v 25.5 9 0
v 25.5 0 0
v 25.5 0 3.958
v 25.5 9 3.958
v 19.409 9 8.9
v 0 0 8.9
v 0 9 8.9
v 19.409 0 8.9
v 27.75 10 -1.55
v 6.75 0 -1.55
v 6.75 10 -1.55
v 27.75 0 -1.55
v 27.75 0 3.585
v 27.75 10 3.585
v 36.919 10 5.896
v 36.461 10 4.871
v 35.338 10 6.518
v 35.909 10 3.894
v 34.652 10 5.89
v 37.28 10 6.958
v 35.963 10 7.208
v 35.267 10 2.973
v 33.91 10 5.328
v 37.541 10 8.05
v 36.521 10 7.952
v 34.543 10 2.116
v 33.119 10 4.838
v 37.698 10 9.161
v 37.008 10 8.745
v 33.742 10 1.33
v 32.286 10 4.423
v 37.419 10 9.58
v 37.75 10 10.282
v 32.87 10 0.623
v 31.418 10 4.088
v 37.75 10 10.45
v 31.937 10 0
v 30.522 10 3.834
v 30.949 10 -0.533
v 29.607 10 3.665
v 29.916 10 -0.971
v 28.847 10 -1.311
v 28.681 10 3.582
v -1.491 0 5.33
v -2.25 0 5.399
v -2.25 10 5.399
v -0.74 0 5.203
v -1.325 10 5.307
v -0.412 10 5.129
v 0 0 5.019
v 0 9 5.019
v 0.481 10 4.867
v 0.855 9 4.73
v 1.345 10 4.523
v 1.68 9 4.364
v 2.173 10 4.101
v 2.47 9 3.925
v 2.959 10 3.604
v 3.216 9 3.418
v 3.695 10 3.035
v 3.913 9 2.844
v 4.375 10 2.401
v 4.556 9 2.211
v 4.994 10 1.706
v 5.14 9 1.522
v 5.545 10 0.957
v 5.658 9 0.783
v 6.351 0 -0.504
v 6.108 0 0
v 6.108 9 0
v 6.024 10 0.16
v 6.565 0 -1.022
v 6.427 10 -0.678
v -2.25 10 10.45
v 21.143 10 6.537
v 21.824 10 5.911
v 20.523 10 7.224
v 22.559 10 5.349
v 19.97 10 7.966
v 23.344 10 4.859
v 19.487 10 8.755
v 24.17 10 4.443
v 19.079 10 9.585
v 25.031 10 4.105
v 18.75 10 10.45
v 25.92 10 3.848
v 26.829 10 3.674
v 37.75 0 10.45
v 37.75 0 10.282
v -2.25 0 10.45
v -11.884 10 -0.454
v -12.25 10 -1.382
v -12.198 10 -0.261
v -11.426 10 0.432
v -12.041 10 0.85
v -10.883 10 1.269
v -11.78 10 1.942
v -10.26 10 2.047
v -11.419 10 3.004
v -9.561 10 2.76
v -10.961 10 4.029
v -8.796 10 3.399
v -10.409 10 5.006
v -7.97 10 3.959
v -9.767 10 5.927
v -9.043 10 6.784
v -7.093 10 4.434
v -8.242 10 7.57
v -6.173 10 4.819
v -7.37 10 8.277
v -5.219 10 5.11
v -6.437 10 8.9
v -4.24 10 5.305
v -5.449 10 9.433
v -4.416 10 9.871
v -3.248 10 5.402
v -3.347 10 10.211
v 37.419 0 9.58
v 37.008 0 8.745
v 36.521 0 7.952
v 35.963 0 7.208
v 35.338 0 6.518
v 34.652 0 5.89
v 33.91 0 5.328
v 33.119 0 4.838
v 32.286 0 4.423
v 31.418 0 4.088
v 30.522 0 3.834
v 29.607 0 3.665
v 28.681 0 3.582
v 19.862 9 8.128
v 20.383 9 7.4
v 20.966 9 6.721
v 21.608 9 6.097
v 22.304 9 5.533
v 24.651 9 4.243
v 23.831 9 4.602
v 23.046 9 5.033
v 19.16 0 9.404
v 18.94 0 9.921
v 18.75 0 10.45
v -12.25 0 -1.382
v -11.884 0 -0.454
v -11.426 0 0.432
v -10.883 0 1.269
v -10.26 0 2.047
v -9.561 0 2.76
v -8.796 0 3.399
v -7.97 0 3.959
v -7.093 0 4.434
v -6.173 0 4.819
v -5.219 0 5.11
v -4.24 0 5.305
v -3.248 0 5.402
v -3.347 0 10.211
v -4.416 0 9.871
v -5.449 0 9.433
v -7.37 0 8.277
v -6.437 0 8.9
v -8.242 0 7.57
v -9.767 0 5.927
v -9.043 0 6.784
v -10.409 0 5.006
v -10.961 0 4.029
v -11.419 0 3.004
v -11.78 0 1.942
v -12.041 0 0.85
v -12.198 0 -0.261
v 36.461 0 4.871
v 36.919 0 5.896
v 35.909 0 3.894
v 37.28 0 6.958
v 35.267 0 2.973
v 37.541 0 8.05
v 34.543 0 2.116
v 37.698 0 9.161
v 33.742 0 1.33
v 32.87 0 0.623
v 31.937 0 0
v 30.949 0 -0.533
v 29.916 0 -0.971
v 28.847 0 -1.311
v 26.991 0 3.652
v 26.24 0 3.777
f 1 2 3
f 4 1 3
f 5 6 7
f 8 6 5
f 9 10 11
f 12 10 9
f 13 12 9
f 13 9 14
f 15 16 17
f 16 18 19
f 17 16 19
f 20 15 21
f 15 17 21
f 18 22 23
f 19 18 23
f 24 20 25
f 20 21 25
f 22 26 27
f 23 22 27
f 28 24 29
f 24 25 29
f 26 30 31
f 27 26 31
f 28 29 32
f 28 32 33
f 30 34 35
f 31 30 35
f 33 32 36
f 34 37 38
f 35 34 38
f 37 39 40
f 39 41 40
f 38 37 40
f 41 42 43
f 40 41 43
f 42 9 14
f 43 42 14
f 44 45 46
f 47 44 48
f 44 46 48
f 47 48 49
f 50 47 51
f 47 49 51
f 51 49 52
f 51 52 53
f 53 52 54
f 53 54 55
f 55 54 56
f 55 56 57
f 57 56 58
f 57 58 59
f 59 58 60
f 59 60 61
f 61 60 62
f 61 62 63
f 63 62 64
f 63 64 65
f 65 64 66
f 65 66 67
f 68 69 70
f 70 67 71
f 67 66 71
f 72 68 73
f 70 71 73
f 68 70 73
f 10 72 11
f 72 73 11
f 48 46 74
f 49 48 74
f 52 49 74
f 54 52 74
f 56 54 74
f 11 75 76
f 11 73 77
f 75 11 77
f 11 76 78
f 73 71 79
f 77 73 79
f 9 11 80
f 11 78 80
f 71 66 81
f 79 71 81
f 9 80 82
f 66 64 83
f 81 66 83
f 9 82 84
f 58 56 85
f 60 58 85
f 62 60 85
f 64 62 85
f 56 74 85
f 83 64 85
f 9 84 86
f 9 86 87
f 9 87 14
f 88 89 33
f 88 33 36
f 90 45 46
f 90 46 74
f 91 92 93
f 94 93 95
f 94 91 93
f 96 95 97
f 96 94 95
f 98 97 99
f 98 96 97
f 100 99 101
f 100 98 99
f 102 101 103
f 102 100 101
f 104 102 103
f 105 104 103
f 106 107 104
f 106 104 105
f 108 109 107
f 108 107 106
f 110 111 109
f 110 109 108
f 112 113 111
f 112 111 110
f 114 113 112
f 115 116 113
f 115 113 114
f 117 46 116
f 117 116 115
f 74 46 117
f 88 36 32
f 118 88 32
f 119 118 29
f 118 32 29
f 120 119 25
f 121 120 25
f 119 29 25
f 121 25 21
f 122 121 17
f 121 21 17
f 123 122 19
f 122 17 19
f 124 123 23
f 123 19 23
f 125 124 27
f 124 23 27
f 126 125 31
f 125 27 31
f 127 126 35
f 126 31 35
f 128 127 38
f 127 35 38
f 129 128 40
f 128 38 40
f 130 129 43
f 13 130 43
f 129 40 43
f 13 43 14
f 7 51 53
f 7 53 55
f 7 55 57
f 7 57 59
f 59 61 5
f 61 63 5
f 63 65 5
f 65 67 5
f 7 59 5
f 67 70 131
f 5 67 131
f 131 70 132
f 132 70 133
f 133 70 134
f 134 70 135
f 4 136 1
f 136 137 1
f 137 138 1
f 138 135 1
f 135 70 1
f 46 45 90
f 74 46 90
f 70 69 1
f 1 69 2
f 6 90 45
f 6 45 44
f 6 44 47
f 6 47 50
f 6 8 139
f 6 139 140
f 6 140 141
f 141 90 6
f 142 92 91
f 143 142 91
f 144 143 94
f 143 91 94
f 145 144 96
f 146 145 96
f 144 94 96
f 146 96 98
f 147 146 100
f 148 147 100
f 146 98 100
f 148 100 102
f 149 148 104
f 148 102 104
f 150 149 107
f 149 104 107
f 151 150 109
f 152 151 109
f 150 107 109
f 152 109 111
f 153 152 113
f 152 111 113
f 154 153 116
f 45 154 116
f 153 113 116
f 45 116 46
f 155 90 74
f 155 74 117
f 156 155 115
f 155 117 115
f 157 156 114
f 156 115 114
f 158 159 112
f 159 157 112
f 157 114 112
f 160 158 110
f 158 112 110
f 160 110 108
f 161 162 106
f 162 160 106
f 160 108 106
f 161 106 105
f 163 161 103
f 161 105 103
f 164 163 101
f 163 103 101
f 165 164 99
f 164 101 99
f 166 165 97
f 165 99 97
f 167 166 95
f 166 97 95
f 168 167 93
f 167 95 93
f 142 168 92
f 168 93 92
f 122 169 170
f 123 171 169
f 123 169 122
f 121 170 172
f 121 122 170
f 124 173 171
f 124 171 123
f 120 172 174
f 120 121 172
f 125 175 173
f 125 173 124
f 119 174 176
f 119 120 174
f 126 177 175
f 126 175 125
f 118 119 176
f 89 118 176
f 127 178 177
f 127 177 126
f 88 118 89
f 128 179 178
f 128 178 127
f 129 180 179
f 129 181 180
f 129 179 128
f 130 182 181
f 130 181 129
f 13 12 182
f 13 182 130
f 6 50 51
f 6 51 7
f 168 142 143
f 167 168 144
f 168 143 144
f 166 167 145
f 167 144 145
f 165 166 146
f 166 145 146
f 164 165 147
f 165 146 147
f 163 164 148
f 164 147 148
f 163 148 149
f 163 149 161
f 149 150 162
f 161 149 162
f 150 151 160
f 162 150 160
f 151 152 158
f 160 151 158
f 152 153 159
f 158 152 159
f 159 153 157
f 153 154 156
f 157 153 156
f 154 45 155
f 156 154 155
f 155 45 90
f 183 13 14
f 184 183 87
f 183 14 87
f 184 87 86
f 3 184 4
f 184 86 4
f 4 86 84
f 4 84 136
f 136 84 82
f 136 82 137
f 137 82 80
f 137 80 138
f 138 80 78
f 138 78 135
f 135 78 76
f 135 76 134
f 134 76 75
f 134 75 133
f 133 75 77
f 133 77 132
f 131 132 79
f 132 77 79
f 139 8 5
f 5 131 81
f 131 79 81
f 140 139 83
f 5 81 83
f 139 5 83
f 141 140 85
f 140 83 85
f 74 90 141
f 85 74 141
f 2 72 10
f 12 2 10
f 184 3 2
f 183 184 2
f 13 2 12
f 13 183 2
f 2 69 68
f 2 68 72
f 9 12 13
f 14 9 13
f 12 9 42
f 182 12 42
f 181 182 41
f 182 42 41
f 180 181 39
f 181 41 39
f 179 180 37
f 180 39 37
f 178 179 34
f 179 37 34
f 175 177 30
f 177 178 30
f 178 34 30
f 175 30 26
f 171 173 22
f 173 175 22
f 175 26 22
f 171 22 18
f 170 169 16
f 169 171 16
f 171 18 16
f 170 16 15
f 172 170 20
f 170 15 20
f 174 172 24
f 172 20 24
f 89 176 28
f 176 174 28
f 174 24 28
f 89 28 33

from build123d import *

# Parameters (mm, degrees)
F0_W          = 25.5
F0_H          = 8.9
F1_DEPTH      = 8.9
F2_W          = 30
F2_H          = 12
F2_W_2        = 25.5
F2_H_2        = 8.9
F3_DEPTH      = 10
F4_DEPTH      = 9
F5_DEPTH      = 10
F6_DEPTH      = 10
F9_T1_DEPTH   = 69.160797831
F9_2_T1_DEPTH = 69.160797831
F11_DEPTH     = 10


# Not quite as in the source:
# - a fillet or chamfer that OpenCascade refuses, or shapes differently, is made with other operations: its cross-section is extruded or revolved along the edge and cut away or added


with BuildPart() as f1:
    # F0 (on Top) → F1 (new body)
    with BuildSketch(Plane.XY):
        with Locations((12.75, 4.45)):
            Rectangle(F0_W, F0_H)
    extrude(amount=F1_DEPTH)


with BuildPart() as f3:
    # F2 (on face) → F3 (new body)
    with BuildSketch(Plane.XZ):
        with Locations((12.75, 4.45)):
            Rectangle(F2_W, F2_H)
        with Locations((12.75, 4.45)):
            Rectangle(F2_W_2, F2_H_2, mode=Mode.SUBTRACT)
        with Locations((12.75, 4.45)):
            Rectangle(F2_W_2, F2_H_2)
    extrude(amount=-F3_DEPTH)


with BuildPart() as f4_tool:
    # F4 (cut): a face of the model
    f4_faces = [f1.part.faces().sort_by_distance(p)[0] for p in [
        (12.75, 0, 4.45),
    ]]
    extrude(f4_faces, amount=-F4_DEPTH)


with BuildPart() as f1_1:
    add(f1.part)

    # F4: cut by f4_tool
    add(f4_tool.part, mode=Mode.SUBTRACT)


with BuildPart() as f3_1:
    add(f3.part)

    # F4: cut by f4_tool
    add(f4_tool.part, mode=Mode.SUBTRACT)


with BuildPart() as f5:
    # F5 (new): a face of the model
    f5_faces = [f3_1.part.faces().sort_by_distance(p)[0] for p in [
        (-2.25, 5, 4.45),
    ]]
    extrude(f5_faces, amount=F5_DEPTH)

    # F9: fillet of radius 12 on 1 edges, made by hand

    # F9_s2 → F9_t1 (cut)
    with BuildSketch(Plane.XZ.offset(-39.5803989155)):
        with BuildLine():
            ThreePointArc((-2.25, 10.45), (-9.4151513899, 6.3638071262), (-12.25, -1.3821595662))
            Line((-12.25, -1.3821595662), (-12.25, 10.45))
            Line((-12.25, 10.45), (-2.25, 10.45))
        make_face()
    extrude(amount=F9_T1_DEPTH, mode=Mode.SUBTRACT)


with BuildPart() as f6:
    # F6 (new): a face of the model
    f6_faces = [f3_1.part.faces().sort_by_distance(p)[0] for p in [
        (27.75, 5, 4.45),
    ]]
    extrude(f6_faces, amount=F6_DEPTH)

    # F9#2: fillet of radius 12 on 1 edges, made by hand

    # F9_2_s2 → F9_2_t1 (cut)
    with BuildSketch(Plane.XZ.offset(-39.5803989155)):
        with BuildLine():
            ThreePointArc((27.75, -1.55), (34.9151513899, 2.5361928738), (37.75, 10.2821595662))
            Line((37.75, 10.2821595662), (37.75, -1.55))
            Line((37.75, -1.55), (27.75, -1.55))
        make_face()
    extrude(amount=F9_2_T1_DEPTH, mode=Mode.SUBTRACT)


with BuildPart() as f11_tool:
    # F10 (on face) → F11 (new body)
    with BuildSketch(Plane(origin=(0, 10, 0), x_dir=(-1, 0, 0), z_dir=(0, 1, 0))):
        with BuildLine():
            Line((-27.75, 3.5850068215), (-27.75, 10.45))
            Line((-27.75, 10.45), (-37.75, 10.45))
            ThreePointArc((-37.75, 10.45), (-33.9096848707, 5.3282302527), (-27.75, 3.5850068215))
        make_face()
        with BuildLine():
            ThreePointArc((-27.75, 3.5850068215), (-22.1851807253, 5.6215262811), (-18.75, 10.45))
            Line((-18.75, 10.45), (-27.75, 10.45))
            Line((-27.75, 10.45), (-27.75, 3.5850068215))
        make_face()
        with BuildLine():
            ThreePointArc((-6.75, 29.45), (-13.6275010008, 19.95), (-6.75, 10.45))
            Line((-6.75, 10.45), (-6.75, 29.45))
        make_face()
        with BuildLine():
            Line((2.25, 5.3987446019), (2.25, -1.55))
            Line((2.25, -1.55), (12.25, -1.55))
            Line((12.25, -1.55), (12.25, -1.3821595662))
            ThreePointArc((12.25, -1.3821595662), (8.389860126, 3.6892779702), (2.25, 5.3987446019))
        make_face()
        with BuildLine():
            ThreePointArc((2.25, 5.3987446019), (-3.3337079529, 3.3279886569), (-6.75, -1.55))
            Line((-6.75, -1.55), (2.25, -1.55))
            Line((2.25, -1.55), (2.25, 5.3987446019))
        make_face()
        with BuildLine():
            ThreePointArc((-18.75, -20.55), (-11.8724989992, -11.05), (-18.75, -1.55))
            Line((-18.75, -1.55), (-18.75, -20.55))
        make_face()
    extrude(amount=-F11_DEPTH)


with BuildPart() as f3_2:
    add(f3_1.part)

    # F11: cut by f11_tool
    add(f11_tool.part, mode=Mode.SUBTRACT)


with BuildPart() as f5_1:
    add(f5.part)

    # F11: cut by f11_tool
    add(f11_tool.part, mode=Mode.SUBTRACT)


with BuildPart() as f6_1:
    add(f6.part)

    # F11: cut by f11_tool
    add(f11_tool.part, mode=Mode.SUBTRACT)


solid = Compound([f3_2.part, f5_1.part, f6_1.part])
